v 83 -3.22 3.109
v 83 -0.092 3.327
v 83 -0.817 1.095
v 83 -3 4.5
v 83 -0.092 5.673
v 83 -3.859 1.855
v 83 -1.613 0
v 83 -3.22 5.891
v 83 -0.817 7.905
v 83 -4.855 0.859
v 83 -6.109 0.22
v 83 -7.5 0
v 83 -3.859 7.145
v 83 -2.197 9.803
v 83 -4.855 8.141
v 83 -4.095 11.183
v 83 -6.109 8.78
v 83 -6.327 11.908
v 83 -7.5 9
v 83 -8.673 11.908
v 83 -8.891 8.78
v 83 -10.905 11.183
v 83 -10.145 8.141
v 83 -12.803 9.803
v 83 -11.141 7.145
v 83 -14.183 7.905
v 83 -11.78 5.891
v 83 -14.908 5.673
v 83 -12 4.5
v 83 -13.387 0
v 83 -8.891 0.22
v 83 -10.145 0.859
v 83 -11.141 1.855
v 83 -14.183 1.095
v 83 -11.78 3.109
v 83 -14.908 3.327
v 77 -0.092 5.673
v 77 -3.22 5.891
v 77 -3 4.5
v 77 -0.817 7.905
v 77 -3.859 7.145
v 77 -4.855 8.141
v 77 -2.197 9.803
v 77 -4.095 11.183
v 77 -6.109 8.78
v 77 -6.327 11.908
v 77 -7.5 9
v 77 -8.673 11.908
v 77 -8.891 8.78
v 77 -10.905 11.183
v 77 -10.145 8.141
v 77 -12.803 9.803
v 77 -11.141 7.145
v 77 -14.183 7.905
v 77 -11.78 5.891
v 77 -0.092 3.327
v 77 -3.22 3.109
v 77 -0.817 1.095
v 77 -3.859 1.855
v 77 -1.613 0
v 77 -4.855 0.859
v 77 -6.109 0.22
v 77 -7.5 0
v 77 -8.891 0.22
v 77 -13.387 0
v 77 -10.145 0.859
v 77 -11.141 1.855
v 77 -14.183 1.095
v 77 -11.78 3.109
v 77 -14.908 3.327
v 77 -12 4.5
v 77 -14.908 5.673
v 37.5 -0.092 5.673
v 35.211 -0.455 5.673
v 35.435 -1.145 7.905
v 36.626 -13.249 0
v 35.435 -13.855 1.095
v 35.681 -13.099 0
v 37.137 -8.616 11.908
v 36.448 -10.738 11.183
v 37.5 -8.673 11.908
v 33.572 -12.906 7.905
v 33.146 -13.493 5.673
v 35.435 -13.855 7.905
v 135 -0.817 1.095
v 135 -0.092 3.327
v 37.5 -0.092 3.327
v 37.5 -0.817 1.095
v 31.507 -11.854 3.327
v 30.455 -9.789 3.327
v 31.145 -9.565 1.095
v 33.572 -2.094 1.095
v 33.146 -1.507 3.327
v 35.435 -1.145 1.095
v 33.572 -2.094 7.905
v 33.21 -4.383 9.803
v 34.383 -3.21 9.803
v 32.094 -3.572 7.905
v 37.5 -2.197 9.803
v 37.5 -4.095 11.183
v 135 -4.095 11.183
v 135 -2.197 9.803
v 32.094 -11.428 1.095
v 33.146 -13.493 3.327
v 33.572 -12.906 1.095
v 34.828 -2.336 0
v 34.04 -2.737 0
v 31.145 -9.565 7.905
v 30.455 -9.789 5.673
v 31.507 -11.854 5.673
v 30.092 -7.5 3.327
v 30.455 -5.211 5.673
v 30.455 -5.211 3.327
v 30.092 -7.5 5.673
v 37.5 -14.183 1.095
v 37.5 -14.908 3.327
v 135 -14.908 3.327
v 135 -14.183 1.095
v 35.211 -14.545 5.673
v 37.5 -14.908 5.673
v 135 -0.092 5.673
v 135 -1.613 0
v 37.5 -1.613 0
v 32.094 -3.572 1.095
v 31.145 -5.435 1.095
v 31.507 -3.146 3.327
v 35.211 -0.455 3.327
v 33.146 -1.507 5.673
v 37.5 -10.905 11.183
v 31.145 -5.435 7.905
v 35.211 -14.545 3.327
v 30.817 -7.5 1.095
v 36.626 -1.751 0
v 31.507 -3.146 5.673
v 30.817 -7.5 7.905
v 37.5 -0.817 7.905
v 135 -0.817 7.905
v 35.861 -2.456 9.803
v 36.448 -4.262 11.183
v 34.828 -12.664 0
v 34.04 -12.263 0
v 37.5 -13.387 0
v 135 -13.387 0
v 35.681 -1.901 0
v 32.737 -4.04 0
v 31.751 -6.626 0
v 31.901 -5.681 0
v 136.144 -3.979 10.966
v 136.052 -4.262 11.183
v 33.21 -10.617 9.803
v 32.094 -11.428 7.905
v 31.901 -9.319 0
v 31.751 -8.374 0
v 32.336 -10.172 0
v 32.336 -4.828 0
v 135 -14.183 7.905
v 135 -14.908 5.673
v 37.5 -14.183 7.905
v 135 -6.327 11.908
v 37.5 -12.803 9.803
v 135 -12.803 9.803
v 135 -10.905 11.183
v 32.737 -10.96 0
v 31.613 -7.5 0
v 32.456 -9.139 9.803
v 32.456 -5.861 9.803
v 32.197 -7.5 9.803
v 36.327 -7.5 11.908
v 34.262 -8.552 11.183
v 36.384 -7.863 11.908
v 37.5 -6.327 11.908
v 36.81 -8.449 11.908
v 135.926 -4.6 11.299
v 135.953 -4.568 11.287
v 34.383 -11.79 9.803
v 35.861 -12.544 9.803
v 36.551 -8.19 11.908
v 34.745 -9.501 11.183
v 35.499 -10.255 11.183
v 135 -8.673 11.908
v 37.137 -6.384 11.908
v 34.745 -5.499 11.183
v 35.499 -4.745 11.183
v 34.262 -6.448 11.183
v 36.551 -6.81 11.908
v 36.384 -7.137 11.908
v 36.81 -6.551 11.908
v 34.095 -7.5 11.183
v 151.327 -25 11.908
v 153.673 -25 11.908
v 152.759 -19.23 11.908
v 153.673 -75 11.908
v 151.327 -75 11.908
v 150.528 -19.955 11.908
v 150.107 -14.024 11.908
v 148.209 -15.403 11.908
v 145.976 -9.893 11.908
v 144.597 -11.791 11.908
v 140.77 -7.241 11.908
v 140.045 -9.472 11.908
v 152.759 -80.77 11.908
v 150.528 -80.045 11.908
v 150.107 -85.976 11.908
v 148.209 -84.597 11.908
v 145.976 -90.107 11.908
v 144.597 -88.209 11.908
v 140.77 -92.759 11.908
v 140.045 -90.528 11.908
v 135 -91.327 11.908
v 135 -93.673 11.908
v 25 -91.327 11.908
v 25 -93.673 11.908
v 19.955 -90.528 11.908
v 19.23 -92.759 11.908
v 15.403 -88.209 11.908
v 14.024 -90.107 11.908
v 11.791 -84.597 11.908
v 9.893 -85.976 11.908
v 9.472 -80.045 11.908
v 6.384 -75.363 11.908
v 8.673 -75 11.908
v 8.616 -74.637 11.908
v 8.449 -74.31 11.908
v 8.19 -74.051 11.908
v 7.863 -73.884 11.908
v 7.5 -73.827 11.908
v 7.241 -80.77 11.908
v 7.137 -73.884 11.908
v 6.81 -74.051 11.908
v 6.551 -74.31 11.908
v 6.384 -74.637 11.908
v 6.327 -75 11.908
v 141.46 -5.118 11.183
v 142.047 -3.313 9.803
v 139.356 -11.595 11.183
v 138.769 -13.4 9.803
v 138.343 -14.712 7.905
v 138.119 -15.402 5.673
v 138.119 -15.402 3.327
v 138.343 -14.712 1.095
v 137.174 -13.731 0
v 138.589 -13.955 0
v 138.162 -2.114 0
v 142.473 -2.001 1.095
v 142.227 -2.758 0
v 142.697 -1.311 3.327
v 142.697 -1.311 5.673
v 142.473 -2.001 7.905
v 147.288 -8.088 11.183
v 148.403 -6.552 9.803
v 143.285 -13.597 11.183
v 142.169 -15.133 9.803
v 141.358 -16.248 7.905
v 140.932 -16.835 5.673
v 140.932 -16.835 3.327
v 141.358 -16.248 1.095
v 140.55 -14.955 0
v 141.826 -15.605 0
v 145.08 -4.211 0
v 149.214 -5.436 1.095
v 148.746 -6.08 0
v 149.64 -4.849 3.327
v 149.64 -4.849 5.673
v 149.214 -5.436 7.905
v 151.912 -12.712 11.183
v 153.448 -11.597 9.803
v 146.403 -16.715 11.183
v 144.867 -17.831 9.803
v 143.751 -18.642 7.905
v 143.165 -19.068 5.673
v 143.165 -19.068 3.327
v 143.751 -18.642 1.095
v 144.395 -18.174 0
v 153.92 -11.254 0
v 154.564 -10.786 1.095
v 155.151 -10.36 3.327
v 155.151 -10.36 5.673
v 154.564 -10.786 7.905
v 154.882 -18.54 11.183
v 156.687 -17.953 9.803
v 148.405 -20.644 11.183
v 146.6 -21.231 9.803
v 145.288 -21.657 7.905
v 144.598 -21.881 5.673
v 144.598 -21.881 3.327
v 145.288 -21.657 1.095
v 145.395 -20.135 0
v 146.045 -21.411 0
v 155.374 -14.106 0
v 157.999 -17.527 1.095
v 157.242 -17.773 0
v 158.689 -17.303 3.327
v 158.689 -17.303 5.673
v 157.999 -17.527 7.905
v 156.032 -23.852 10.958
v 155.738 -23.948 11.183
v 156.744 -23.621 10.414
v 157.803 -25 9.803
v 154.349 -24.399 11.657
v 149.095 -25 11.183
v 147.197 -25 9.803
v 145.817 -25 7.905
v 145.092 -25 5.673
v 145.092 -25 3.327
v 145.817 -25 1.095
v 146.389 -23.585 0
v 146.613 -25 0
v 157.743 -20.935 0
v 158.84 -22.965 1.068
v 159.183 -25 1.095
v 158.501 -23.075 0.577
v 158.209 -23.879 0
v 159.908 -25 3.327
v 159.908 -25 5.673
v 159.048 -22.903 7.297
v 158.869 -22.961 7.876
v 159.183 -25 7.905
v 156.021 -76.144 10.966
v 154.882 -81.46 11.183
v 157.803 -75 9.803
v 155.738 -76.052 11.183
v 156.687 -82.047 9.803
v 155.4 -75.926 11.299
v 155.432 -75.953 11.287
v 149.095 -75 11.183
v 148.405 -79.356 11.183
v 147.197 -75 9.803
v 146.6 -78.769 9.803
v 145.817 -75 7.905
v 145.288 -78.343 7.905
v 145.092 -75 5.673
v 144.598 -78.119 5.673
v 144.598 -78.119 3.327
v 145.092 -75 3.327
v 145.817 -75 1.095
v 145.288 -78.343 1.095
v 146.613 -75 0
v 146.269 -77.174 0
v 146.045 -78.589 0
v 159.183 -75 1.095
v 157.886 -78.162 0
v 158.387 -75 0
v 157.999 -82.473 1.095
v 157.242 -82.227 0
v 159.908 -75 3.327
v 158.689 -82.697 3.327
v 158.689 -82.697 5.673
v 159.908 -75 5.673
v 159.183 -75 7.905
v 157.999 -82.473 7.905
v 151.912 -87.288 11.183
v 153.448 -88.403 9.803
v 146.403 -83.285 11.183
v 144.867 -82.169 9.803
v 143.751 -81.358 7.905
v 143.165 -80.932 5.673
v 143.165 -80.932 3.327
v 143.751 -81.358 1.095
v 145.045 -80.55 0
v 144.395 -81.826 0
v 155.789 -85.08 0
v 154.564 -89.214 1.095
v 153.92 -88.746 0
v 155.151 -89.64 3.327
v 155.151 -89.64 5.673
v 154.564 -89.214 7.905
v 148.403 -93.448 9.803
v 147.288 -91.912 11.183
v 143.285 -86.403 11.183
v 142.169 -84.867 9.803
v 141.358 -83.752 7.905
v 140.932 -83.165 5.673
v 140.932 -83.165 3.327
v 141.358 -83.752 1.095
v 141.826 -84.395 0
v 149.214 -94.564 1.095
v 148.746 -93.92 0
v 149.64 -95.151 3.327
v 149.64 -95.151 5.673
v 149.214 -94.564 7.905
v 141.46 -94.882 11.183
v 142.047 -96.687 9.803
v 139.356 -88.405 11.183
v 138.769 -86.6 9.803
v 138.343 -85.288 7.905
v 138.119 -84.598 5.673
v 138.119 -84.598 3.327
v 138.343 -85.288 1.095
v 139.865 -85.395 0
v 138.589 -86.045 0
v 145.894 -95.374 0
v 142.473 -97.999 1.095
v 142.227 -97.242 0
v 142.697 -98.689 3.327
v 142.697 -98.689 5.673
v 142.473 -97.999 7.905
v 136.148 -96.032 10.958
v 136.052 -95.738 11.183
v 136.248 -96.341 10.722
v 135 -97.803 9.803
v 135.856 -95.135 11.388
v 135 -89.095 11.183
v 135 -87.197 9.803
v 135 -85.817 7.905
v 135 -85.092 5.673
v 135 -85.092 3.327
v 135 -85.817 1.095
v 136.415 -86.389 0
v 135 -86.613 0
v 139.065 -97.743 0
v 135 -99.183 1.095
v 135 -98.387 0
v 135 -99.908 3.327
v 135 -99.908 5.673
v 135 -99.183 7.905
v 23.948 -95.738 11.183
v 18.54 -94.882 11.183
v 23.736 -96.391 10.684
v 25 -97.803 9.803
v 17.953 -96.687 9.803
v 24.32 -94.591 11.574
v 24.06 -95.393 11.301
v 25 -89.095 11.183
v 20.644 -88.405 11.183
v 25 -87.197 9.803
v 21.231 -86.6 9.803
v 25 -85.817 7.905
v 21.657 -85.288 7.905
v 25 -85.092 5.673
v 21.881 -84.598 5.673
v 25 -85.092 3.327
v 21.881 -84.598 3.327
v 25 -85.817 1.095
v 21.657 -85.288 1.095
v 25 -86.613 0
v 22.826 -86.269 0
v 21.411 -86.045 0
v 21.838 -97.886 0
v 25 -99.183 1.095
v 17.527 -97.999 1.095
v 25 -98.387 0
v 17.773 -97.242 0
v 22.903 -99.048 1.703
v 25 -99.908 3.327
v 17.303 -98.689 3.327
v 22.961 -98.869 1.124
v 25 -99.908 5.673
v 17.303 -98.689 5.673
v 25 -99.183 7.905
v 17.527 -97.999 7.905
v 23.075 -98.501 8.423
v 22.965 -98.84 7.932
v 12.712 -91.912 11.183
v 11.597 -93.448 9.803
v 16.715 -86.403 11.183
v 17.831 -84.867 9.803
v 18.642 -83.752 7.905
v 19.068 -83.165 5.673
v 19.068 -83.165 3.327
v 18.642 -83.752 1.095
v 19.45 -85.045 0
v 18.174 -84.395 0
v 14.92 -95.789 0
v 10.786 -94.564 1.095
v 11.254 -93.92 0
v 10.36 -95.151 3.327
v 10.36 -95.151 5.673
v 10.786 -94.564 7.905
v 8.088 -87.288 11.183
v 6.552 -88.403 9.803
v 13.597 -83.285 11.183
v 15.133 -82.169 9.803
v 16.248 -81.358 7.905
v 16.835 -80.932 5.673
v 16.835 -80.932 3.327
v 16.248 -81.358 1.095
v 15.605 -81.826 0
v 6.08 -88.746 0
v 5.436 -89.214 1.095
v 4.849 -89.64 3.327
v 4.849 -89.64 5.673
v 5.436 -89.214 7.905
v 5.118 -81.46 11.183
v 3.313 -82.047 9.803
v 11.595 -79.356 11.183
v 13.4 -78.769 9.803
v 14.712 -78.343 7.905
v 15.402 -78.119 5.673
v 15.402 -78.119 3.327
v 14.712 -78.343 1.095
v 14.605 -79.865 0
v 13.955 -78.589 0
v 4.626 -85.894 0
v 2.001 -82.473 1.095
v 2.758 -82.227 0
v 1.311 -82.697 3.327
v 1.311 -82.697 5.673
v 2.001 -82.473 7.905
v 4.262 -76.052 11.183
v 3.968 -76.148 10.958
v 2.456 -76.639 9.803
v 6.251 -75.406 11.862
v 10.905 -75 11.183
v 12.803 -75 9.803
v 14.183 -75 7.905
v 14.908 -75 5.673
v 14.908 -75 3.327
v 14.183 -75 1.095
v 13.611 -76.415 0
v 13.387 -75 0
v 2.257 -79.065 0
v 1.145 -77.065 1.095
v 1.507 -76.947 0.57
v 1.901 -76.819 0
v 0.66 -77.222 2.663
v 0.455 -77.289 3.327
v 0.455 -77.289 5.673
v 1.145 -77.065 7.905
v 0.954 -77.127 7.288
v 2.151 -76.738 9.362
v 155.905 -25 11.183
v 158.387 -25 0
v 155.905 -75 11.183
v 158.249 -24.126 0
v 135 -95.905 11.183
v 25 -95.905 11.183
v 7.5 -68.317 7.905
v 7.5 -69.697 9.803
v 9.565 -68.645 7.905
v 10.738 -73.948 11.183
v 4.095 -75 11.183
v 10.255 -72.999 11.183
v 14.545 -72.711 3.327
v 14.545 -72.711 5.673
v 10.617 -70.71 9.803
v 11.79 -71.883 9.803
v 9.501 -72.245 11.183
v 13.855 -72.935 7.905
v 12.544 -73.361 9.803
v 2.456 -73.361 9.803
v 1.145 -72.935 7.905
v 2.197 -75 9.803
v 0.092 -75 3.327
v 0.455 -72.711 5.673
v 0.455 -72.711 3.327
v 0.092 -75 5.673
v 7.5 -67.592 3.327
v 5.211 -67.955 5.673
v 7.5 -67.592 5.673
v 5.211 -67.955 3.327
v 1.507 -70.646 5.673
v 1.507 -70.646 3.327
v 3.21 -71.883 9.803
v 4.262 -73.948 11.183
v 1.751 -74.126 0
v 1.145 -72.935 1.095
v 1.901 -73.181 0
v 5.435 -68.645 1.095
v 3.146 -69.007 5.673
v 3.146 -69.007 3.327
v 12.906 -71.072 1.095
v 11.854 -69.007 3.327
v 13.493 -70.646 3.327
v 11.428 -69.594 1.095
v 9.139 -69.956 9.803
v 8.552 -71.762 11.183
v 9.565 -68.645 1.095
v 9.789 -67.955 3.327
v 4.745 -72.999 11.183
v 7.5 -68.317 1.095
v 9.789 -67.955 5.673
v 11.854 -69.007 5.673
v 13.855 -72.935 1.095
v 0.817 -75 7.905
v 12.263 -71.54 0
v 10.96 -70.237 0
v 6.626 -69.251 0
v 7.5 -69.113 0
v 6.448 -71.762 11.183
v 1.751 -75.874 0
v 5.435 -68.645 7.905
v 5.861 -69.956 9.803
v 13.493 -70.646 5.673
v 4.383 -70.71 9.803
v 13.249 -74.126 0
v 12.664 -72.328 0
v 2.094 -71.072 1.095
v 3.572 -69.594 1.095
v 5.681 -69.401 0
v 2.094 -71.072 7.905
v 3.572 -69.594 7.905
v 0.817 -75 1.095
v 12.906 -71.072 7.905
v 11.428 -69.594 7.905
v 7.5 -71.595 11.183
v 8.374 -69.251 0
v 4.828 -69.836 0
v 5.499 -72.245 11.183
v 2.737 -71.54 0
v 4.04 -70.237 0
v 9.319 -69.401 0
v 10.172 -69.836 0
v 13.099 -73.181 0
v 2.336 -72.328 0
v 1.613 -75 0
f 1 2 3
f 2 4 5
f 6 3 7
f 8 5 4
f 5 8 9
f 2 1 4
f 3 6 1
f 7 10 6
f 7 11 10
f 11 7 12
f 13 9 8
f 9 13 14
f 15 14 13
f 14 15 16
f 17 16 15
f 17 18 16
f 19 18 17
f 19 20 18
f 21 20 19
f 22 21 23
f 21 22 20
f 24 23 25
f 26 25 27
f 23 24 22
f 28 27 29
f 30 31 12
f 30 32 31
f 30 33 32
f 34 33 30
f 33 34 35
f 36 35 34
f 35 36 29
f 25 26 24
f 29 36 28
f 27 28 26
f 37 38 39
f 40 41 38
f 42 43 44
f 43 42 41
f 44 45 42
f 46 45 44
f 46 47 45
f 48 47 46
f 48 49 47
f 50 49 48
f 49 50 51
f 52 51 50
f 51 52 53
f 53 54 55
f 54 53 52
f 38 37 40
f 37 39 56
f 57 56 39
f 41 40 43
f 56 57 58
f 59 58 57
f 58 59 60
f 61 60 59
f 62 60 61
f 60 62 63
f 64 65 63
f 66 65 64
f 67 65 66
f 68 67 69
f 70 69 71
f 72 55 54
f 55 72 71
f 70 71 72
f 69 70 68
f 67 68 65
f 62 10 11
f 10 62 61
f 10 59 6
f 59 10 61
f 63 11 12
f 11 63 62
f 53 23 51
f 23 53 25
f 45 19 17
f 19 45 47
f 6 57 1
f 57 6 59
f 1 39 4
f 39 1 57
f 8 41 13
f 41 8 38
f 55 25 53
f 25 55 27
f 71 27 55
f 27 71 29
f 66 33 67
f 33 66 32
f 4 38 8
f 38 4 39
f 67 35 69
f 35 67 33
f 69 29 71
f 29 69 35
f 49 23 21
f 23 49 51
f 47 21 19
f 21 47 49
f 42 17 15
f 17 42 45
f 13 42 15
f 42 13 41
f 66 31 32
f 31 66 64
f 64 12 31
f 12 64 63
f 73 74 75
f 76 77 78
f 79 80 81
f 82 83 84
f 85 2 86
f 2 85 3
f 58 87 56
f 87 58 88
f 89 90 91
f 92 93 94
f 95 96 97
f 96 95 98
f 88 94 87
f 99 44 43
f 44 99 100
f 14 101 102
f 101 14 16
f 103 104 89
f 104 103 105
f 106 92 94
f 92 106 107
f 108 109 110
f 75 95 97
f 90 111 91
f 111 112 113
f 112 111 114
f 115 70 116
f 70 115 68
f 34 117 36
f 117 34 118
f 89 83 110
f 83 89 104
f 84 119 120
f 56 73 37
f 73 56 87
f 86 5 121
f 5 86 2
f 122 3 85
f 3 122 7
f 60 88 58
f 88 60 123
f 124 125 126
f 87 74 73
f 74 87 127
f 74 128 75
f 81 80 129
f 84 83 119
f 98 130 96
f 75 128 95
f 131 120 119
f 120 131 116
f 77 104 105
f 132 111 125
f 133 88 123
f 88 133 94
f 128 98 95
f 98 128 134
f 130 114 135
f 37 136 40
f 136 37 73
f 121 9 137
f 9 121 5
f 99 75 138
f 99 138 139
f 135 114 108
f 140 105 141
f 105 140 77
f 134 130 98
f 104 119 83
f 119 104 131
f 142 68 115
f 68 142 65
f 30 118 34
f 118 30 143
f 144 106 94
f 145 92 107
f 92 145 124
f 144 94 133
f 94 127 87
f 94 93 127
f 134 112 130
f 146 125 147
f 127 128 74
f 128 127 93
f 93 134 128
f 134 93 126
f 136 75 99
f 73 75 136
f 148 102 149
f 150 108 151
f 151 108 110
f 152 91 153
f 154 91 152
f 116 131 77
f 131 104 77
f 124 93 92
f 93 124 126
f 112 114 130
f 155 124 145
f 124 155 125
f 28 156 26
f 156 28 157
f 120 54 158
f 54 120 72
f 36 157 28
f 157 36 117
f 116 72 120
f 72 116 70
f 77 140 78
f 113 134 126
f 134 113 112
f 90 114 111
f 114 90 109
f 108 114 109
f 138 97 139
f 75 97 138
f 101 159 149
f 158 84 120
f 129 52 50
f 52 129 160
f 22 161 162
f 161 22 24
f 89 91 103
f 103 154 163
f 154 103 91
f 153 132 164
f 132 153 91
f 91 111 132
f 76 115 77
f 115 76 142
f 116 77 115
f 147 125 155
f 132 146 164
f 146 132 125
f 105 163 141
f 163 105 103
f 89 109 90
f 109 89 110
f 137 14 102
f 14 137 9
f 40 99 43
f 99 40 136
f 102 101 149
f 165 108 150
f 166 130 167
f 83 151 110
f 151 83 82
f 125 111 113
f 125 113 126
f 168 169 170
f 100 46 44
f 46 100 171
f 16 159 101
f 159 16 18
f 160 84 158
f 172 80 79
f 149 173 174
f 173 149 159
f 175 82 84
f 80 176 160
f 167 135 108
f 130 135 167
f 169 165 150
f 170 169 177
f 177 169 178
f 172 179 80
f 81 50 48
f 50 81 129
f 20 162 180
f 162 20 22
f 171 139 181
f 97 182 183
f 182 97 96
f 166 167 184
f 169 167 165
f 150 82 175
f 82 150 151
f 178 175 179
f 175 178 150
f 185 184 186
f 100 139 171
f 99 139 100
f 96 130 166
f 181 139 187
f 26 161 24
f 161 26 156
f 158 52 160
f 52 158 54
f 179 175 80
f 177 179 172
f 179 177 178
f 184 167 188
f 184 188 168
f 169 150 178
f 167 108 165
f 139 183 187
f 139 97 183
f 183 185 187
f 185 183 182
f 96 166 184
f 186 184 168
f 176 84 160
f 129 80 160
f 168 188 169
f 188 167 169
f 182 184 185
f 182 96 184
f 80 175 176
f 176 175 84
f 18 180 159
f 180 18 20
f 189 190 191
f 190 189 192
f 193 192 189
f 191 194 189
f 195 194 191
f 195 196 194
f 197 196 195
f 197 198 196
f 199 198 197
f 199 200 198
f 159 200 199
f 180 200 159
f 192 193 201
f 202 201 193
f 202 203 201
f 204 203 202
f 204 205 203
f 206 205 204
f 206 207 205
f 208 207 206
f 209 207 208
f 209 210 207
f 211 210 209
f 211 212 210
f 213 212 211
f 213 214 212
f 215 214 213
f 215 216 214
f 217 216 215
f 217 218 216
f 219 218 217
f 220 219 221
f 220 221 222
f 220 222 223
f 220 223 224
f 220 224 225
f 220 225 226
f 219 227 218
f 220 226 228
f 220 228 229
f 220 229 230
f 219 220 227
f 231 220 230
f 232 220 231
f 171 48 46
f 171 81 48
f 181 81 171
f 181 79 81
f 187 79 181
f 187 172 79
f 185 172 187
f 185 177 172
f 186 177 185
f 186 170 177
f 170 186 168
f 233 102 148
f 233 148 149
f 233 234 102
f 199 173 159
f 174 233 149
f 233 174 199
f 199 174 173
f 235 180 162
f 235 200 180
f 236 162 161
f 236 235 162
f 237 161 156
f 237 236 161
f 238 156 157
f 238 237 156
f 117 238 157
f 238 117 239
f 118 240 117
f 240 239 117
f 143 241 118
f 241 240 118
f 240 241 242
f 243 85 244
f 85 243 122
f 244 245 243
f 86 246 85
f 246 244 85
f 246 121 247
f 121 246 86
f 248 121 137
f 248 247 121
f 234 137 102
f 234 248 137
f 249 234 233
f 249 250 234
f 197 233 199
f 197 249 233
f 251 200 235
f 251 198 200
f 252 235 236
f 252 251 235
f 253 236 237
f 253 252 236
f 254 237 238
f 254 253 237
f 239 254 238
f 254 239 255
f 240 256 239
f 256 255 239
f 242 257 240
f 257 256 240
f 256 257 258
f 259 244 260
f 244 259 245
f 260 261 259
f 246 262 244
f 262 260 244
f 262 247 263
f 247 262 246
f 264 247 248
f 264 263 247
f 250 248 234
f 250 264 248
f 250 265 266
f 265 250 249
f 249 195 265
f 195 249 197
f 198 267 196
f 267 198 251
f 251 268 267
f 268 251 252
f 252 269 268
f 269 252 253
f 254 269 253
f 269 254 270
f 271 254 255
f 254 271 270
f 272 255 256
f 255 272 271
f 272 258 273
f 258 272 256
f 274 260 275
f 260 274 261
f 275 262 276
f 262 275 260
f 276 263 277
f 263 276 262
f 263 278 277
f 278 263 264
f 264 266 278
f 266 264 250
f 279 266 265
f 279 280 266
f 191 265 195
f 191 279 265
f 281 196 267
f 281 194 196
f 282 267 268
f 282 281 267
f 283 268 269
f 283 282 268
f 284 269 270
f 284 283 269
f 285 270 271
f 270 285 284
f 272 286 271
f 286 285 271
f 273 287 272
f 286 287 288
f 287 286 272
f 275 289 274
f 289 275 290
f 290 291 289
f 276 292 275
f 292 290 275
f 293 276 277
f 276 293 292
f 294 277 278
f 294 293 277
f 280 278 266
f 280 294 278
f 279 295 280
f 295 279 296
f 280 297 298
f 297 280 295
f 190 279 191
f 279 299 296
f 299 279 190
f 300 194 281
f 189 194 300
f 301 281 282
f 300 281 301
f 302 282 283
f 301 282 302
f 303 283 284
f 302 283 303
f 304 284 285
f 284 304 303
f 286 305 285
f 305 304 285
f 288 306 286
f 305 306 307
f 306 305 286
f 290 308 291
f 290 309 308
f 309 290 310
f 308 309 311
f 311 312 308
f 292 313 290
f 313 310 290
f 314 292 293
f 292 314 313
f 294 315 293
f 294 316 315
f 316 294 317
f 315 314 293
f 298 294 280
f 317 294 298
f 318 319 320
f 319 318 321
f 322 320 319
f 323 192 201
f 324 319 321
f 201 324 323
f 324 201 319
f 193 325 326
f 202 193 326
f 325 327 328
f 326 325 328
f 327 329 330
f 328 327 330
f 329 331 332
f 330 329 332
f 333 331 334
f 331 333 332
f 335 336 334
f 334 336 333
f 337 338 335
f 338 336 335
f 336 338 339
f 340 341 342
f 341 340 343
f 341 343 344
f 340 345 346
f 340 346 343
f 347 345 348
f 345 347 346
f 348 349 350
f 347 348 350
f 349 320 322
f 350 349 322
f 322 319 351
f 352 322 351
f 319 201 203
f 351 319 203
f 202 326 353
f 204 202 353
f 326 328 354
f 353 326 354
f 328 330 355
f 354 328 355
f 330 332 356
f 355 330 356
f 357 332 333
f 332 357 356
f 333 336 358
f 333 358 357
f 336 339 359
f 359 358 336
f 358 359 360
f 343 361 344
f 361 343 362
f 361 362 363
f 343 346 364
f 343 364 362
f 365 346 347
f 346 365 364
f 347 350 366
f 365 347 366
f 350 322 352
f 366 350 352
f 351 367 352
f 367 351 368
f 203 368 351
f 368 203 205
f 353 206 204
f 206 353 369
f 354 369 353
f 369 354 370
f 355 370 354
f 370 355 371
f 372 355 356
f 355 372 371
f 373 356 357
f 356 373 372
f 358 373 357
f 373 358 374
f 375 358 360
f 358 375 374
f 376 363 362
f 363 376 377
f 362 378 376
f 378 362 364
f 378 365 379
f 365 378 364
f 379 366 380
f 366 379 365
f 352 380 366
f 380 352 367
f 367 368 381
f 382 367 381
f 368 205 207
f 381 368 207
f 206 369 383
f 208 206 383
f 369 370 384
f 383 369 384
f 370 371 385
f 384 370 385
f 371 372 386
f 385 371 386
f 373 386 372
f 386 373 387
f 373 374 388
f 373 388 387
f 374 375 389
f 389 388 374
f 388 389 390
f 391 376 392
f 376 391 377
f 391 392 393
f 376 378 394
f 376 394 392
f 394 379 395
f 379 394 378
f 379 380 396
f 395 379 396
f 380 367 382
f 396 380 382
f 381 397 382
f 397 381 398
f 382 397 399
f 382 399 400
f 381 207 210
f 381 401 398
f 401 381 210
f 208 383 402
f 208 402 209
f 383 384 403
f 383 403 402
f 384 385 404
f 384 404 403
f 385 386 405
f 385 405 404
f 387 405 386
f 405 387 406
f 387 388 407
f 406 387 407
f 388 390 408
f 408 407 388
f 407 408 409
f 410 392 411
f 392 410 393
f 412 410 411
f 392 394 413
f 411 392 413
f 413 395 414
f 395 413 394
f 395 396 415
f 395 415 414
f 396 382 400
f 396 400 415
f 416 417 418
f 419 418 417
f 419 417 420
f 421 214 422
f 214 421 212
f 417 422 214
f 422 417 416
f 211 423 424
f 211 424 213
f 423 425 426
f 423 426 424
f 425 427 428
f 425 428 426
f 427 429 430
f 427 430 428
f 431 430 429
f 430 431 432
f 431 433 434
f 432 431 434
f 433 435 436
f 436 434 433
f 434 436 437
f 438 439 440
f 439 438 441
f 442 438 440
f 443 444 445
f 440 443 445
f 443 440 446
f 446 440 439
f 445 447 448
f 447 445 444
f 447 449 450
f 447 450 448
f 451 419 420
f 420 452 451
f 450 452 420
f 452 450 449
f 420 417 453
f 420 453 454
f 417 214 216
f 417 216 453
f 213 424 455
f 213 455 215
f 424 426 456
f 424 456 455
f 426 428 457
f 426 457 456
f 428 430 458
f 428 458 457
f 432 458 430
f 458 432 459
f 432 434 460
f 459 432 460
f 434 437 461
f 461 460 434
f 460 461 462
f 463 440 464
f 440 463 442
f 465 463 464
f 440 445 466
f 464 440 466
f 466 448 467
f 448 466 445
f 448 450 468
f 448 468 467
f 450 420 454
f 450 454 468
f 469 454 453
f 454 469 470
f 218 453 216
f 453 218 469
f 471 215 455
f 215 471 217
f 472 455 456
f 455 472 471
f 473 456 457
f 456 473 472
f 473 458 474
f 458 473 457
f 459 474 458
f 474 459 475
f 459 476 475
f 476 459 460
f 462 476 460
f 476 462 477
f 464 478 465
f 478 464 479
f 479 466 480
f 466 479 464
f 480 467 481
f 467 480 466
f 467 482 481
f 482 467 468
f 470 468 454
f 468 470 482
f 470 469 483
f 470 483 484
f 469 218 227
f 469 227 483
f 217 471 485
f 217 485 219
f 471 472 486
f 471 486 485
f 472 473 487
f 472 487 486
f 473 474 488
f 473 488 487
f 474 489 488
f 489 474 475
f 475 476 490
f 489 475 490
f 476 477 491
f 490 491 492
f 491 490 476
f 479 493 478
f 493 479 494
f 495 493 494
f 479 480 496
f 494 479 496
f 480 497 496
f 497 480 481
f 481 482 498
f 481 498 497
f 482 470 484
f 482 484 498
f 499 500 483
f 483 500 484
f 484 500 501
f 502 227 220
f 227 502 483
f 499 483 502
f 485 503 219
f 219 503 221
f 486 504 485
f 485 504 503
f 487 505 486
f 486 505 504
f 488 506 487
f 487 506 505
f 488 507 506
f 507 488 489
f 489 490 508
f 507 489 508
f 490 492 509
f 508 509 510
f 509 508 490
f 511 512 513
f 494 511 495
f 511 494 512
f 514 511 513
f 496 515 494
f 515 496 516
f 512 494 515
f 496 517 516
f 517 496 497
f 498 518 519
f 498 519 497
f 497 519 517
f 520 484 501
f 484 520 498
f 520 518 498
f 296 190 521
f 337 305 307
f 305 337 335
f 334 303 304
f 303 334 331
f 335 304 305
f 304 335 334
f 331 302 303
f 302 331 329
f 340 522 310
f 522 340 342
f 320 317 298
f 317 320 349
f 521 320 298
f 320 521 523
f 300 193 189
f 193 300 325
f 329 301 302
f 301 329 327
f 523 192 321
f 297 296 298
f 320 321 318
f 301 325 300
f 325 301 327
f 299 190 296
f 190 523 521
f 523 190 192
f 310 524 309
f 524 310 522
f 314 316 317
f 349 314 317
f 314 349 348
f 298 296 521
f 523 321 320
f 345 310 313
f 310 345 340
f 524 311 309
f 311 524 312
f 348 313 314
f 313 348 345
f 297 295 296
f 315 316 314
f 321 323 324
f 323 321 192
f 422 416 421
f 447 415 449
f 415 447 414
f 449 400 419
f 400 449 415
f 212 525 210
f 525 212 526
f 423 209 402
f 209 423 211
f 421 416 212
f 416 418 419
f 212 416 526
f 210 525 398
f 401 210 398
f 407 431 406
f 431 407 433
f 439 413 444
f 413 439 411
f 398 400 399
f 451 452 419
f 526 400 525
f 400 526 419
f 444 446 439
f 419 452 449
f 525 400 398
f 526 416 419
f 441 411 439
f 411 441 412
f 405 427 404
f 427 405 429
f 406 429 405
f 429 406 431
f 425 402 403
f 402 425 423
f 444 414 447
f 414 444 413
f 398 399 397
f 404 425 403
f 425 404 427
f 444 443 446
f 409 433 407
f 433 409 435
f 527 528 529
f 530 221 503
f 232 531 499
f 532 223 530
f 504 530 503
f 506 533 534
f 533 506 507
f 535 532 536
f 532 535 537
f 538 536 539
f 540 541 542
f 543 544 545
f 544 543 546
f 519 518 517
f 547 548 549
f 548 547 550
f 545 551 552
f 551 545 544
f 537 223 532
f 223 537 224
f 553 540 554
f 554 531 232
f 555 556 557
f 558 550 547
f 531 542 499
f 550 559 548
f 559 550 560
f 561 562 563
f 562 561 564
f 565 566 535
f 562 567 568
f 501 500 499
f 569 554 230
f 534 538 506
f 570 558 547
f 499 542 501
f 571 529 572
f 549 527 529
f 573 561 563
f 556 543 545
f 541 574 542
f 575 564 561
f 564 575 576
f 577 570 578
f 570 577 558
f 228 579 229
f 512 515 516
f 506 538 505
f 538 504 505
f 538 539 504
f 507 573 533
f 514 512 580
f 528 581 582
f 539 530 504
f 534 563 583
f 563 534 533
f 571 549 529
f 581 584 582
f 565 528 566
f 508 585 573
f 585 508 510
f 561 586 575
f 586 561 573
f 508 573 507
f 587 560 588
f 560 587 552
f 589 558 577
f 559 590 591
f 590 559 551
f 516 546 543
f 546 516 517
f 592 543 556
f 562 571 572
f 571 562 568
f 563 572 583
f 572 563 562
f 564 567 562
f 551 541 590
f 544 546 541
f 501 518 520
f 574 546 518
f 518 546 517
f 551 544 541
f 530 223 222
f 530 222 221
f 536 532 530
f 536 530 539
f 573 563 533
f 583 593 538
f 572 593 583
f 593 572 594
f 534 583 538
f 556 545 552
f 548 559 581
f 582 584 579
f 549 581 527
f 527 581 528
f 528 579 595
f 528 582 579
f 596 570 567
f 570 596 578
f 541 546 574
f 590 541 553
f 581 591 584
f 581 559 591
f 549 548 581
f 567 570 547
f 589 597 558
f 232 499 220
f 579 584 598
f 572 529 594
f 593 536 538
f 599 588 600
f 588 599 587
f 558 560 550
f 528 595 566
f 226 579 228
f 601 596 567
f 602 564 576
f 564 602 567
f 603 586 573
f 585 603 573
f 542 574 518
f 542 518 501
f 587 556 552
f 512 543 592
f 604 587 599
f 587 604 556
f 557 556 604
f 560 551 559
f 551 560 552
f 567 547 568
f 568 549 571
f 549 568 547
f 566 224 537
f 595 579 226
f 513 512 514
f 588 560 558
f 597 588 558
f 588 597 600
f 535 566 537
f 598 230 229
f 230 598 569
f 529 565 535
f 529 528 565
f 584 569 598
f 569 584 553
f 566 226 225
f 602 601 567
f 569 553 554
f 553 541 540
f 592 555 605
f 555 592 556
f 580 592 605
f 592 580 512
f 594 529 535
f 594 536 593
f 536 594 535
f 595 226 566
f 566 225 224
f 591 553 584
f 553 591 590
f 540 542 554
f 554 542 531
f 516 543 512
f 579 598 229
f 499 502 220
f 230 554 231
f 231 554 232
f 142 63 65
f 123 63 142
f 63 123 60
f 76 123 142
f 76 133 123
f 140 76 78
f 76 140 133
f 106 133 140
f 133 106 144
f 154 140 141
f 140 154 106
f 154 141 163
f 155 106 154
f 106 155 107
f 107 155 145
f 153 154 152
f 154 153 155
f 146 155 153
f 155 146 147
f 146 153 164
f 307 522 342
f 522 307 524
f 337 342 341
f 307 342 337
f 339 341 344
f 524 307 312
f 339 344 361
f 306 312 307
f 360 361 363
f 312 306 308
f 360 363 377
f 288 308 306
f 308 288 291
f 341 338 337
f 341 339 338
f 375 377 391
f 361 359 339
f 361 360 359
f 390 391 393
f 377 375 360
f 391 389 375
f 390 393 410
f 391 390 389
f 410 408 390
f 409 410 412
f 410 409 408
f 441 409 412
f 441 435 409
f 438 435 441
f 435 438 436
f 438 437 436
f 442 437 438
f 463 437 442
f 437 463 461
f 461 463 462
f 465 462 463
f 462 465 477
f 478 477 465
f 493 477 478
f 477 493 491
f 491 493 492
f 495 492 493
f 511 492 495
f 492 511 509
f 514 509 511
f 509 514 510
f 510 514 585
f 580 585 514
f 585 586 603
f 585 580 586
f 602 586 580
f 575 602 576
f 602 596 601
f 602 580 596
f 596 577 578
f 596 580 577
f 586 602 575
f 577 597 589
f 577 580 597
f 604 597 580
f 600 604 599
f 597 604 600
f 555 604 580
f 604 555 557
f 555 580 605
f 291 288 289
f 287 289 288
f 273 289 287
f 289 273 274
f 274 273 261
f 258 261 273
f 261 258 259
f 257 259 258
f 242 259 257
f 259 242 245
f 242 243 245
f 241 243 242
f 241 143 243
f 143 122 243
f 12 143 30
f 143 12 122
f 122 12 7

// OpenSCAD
/*
Toilet paper holder by Jkk79.
It started as a copy of something I have on my bathroom's wall and then expanded into fully customizable thing.
Well, originally, I broke the arm on the one I have and decided to print a replacement arm (it would have been faster and perhaps cheaper to just go and buy a new one), and then I thought that It would be cool to make the whole thing, but the holder part would be impossible to print with the original locking mechanism, at least without support structures, so I had to make my own design.
*/


//
part=1;//[1:Arm,2:Holder]
//Higher quality takes longer time to render and creates a bigger file. 60 is good enough already. 20 is good for preview.
quality=20;//[20,28,36,44,52,60,68,76,84,92,100]
/*[Arm settings]*/
orientation=0;//[0:Left,1:Right]
//
armDiameter=15; 
//
armWidth=160;
//
armHeight=100;
//The inner diameter of the corners in the arm.
armCorner=10;//[0:30]
//This is to make the printing easier. Also doubles as a part of the arm's locking mechanism.
armBottomCutDepth=3;//[2,3,4]
//Width of the notch that locks the arm into it's place. It's counterpart in the holder will be 2mm smaller.
armLockMechanismWidth=6;
/*[Holder settings]*/
//
wallPartWidth=100;
//
wallPartHeight=65;
//Default 4. Thinner than 4 might make the loop that holds the arm too weak.Thicker than 4 seems excessive.
wallPartThickness=4;//[3.0:0.5:8.0]
//The width of the loop that holds the arm.
holderWidth=65;
//Screw placement options
screwPlacements=1;//[0:No screws.1:Sides,2:Corners;3:Top and bottom]
//The diameter of the holes for screws. 
//
screwDistanceFromEdge=10;
//
screwHoleSize=3.2;
//
screwEndSinkAngle=50;
//The depth for the previous setting.
screwEndSinkDepth=2;
//Due to the inaccuracies in printing among other things, the hole for the arm needs to be slightly bigger than the arm itself.
extraSpaceForArm=0.4;

armBendLength=armCorner+armDiameter;
print_part();

module print_part(){
    if(part==1){
        mirror([orientation,0,0])arm();
    }else{
        wallPart();
    }
}

module donut(innerDiameter,donutDiameter){
    rotate_extrude(convexity=10,$fn=quality)translate([innerDiameter+donutDiameter/2,0,0])rotate([0,0,45])circle(r=donutDiameter/2,$fn=quality);
    }
    
module armBend(){
    translate([-(armCorner+armDiameter/2),0,0]){
        difference(){
            donut(armCorner,armDiameter);
            translate([-(armDiameter+armCorner+1),0,-armDiameter/2-1])cube([(armDiameter+armCorner)*2+2,armDiameter+armCorner+1,armDiameter+2]);
            translate([-(armDiameter+armCorner+1),-(armDiameter+armCorner+1),-armDiameter/2-1])cube([(armDiameter+armCorner)+1,armDiameter+armCorner+2,armDiameter+2]);
            }
      }
}

module armPart(length){
hull(){
        translate([0,0,0])sphere(r=armDiameter/2,$fn=quality);
        translate([length,0,0])sphere(r=armDiameter/2,$fn=quality);
}
    }

module armLockCut(){
    difference(){
        translate([0,-armDiameter/2,-armDiameter/2])cube([armLockMechanismWidth,armDiameter,armDiameter]);
        translate([0,0,0])rotate([0,90,0])cylinder(armLockMechanismWidth,armDiameter/2-armBottomCutDepth,armDiameter/2-armBottomCutDepth,$fn=quality);
    }
}
 
module arm(){
    difference(){
        union(){
            translate([0,-armDiameter/2,armDiameter/2-armBottomCutDepth]){
                if((armWidth-2*armBendLength)/2<holderWidth/2){
                    echo(armBendLength);
                    difference(){
                        translate([armBendLength+armWidth-armBendLength*2,0,0])armPart(-(wallPartWidth-armDiameter/2-(wallPartWidth-holderWidth)/2+2));
                        translate([armWidth-armBendLength-armLockMechanismWidth/2-wallPartWidth/2+(wallPartWidth-holderWidth)/2-2,0,0])armLockCut();
                    }
                }else{
                    difference(){
                        
                        translate([armBendLength+armWidth-armBendLength*2,0,0])armPart(-(armWidth/2-armBendLength+wallPartWidth/2-armDiameter/2));
                        translate([armWidth/2-armLockMechanismWidth/2,0,0])armLockCut();
                    }
                }
                translate([armWidth-armBendLength,0,0])rotate([0,0,90])armBend();
                translate([armWidth-armDiameter/2,-armCorner-armDiameter/2,0])rotate([0,0,-90])armPart(armHeight-2*armBendLength);
                translate([armWidth-armDiameter/2,-armHeight+armBendLength+armDiameter/2,0])rotate([0,0,0])armBend();
                translate([armBendLength,-armHeight+armDiameter,0])rotate([0,0,0])armPart(armWidth-armBendLength*2);
                translate([armBendLength,-armHeight+armDiameter,0])rotate([0,0,-90])armBend();
                translate([armDiameter/2,-armHeight+armBendLength+armDiameter/2,0])sphere(r=armDiameter/2,$fn=quality);
            }
        } 
        translate([0,-armHeight,-50])cube([armWidth,armHeight,50]);
    }  
}


module holderFillet(){
    difference(){
        cube([holderWidth,wallPartThickness,wallPartThickness]);
        translate([-1,wallPartThickness,wallPartThickness])rotate([0,90,0])cylinder(holderWidth+2,wallPartThickness,wallPartThickness,$fn=quality);
    }
}

module screwHole(){
    translate([0,0,-1])rotate([0,0,0])cylinder(wallPartThickness+2,screwHoleSize/2,screwHoleSize/2,$fn=quality);
    translate([0,0,wallPartThickness-screwEndSinkDepth])rotate([0,0,0])cylinder(wallPartThickness/2+1,screwHoleSize/2,tan(screwEndSinkAngle)*wallPartThickness/2+screwHoleSize/2,$fn=quality);
}

module wallPart(){
    difference(){
        union(){
            hull(){
                translate([wallPartThickness,wallPartThickness,0])sphere(r=wallPartThickness,$fn=quality);
                translate([wallPartWidth-wallPartThickness,wallPartThickness,0])sphere(r=wallPartThickness,$fn=quality);
                translate([wallPartThickness,wallPartHeight-wallPartThickness,0])sphere(r=wallPartThickness,$fn=quality);
                translate([wallPartWidth-wallPartThickness,wallPartHeight-wallPartThickness,0])sphere(r=wallPartThickness,$fn=quality);
            }
            hull(){
                translate([wallPartWidth/2-holderWidth/2,wallPartHeight/2,armDiameter/2+wallPartThickness])rotate([0,90,0])cylinder(holderWidth,armDiameter/2+wallPartThickness,armDiameter/2+wallPartThickness,$fn=quality);
                translate([wallPartWidth/2-holderWidth/2,wallPartHeight/2,-armDiameter/2])rotate([0,90,0])cylinder(holderWidth,armDiameter/2+wallPartThickness,armDiameter/2+wallPartThickness,$fn=quality);
            }
            translate([wallPartWidth/2-holderWidth/2,wallPartHeight/2+armDiameter/2+wallPartThickness,wallPartThickness])rotate([0,0,0])holderFillet();
            translate([wallPartWidth/2-holderWidth/2,wallPartHeight/2-armDiameter/2-wallPartThickness,wallPartThickness])rotate([90,0,0])holderFillet();
        }
        translate([-1,-1,-100])cube([wallPartWidth+2,wallPartHeight+2,100]);
        difference(){
            hull(){
                    translate([wallPartWidth/2-holderWidth/2-0.001,wallPartHeight/2,armDiameter/2+wallPartThickness])rotate([0,90,0])cylinder(holderWidth+0.002,armDiameter/2+extraSpaceForArm/2,armDiameter/2+extraSpaceForArm/2,$fn=quality);
                    translate([wallPartWidth/2-holderWidth/2,wallPartHeight/2,-armDiameter/2])rotate([0,90,0])cylinder(holderWidth,armDiameter/2+extraSpaceForArm/2,armDiameter/2+extraSpaceForArm/2,$fn=quality);
            }
            translate([wallPartWidth/2-armLockMechanismWidth/2,wallPartHeight/2-armDiameter/2-1,0])cube([armLockMechanismWidth-2,armBottomCutDepth+1-extraSpaceForArm,armDiameter*2]);    
        }
        if(screwPlacements==0){
            
        }else if(screwPlacements==1){
            translate([screwDistanceFromEdge,wallPartHeight/2,0])screwHole();
            translate([wallPartWidth-screwDistanceFromEdge,wallPartHeight/2,0])screwHole();
        }else if(screwPlacements==2){
            translate([screwDistanceFromEdge,wallPartHeight-screwDistanceFromEdge,0])screwHole();
            translate([wallPartWidth-screwDistanceFromEdge,wallPartHeight-screwDistanceFromEdge,0])screwHole();
            translate([screwDistanceFromEdge,screwDistanceFromEdge,0])screwHole();
            translate([wallPartWidth-screwDistanceFromEdge,screwDistanceFromEdge,0])screwHole();
        
        }else if(screwPlacements==3){
            translate([wallPartWidth/2,screwDistanceFromEdge,0])screwHole();
            translate([wallPartWidth/2,wallPartHeight-screwDistanceFromEdge,0])screwHole();
        }
    }
}
